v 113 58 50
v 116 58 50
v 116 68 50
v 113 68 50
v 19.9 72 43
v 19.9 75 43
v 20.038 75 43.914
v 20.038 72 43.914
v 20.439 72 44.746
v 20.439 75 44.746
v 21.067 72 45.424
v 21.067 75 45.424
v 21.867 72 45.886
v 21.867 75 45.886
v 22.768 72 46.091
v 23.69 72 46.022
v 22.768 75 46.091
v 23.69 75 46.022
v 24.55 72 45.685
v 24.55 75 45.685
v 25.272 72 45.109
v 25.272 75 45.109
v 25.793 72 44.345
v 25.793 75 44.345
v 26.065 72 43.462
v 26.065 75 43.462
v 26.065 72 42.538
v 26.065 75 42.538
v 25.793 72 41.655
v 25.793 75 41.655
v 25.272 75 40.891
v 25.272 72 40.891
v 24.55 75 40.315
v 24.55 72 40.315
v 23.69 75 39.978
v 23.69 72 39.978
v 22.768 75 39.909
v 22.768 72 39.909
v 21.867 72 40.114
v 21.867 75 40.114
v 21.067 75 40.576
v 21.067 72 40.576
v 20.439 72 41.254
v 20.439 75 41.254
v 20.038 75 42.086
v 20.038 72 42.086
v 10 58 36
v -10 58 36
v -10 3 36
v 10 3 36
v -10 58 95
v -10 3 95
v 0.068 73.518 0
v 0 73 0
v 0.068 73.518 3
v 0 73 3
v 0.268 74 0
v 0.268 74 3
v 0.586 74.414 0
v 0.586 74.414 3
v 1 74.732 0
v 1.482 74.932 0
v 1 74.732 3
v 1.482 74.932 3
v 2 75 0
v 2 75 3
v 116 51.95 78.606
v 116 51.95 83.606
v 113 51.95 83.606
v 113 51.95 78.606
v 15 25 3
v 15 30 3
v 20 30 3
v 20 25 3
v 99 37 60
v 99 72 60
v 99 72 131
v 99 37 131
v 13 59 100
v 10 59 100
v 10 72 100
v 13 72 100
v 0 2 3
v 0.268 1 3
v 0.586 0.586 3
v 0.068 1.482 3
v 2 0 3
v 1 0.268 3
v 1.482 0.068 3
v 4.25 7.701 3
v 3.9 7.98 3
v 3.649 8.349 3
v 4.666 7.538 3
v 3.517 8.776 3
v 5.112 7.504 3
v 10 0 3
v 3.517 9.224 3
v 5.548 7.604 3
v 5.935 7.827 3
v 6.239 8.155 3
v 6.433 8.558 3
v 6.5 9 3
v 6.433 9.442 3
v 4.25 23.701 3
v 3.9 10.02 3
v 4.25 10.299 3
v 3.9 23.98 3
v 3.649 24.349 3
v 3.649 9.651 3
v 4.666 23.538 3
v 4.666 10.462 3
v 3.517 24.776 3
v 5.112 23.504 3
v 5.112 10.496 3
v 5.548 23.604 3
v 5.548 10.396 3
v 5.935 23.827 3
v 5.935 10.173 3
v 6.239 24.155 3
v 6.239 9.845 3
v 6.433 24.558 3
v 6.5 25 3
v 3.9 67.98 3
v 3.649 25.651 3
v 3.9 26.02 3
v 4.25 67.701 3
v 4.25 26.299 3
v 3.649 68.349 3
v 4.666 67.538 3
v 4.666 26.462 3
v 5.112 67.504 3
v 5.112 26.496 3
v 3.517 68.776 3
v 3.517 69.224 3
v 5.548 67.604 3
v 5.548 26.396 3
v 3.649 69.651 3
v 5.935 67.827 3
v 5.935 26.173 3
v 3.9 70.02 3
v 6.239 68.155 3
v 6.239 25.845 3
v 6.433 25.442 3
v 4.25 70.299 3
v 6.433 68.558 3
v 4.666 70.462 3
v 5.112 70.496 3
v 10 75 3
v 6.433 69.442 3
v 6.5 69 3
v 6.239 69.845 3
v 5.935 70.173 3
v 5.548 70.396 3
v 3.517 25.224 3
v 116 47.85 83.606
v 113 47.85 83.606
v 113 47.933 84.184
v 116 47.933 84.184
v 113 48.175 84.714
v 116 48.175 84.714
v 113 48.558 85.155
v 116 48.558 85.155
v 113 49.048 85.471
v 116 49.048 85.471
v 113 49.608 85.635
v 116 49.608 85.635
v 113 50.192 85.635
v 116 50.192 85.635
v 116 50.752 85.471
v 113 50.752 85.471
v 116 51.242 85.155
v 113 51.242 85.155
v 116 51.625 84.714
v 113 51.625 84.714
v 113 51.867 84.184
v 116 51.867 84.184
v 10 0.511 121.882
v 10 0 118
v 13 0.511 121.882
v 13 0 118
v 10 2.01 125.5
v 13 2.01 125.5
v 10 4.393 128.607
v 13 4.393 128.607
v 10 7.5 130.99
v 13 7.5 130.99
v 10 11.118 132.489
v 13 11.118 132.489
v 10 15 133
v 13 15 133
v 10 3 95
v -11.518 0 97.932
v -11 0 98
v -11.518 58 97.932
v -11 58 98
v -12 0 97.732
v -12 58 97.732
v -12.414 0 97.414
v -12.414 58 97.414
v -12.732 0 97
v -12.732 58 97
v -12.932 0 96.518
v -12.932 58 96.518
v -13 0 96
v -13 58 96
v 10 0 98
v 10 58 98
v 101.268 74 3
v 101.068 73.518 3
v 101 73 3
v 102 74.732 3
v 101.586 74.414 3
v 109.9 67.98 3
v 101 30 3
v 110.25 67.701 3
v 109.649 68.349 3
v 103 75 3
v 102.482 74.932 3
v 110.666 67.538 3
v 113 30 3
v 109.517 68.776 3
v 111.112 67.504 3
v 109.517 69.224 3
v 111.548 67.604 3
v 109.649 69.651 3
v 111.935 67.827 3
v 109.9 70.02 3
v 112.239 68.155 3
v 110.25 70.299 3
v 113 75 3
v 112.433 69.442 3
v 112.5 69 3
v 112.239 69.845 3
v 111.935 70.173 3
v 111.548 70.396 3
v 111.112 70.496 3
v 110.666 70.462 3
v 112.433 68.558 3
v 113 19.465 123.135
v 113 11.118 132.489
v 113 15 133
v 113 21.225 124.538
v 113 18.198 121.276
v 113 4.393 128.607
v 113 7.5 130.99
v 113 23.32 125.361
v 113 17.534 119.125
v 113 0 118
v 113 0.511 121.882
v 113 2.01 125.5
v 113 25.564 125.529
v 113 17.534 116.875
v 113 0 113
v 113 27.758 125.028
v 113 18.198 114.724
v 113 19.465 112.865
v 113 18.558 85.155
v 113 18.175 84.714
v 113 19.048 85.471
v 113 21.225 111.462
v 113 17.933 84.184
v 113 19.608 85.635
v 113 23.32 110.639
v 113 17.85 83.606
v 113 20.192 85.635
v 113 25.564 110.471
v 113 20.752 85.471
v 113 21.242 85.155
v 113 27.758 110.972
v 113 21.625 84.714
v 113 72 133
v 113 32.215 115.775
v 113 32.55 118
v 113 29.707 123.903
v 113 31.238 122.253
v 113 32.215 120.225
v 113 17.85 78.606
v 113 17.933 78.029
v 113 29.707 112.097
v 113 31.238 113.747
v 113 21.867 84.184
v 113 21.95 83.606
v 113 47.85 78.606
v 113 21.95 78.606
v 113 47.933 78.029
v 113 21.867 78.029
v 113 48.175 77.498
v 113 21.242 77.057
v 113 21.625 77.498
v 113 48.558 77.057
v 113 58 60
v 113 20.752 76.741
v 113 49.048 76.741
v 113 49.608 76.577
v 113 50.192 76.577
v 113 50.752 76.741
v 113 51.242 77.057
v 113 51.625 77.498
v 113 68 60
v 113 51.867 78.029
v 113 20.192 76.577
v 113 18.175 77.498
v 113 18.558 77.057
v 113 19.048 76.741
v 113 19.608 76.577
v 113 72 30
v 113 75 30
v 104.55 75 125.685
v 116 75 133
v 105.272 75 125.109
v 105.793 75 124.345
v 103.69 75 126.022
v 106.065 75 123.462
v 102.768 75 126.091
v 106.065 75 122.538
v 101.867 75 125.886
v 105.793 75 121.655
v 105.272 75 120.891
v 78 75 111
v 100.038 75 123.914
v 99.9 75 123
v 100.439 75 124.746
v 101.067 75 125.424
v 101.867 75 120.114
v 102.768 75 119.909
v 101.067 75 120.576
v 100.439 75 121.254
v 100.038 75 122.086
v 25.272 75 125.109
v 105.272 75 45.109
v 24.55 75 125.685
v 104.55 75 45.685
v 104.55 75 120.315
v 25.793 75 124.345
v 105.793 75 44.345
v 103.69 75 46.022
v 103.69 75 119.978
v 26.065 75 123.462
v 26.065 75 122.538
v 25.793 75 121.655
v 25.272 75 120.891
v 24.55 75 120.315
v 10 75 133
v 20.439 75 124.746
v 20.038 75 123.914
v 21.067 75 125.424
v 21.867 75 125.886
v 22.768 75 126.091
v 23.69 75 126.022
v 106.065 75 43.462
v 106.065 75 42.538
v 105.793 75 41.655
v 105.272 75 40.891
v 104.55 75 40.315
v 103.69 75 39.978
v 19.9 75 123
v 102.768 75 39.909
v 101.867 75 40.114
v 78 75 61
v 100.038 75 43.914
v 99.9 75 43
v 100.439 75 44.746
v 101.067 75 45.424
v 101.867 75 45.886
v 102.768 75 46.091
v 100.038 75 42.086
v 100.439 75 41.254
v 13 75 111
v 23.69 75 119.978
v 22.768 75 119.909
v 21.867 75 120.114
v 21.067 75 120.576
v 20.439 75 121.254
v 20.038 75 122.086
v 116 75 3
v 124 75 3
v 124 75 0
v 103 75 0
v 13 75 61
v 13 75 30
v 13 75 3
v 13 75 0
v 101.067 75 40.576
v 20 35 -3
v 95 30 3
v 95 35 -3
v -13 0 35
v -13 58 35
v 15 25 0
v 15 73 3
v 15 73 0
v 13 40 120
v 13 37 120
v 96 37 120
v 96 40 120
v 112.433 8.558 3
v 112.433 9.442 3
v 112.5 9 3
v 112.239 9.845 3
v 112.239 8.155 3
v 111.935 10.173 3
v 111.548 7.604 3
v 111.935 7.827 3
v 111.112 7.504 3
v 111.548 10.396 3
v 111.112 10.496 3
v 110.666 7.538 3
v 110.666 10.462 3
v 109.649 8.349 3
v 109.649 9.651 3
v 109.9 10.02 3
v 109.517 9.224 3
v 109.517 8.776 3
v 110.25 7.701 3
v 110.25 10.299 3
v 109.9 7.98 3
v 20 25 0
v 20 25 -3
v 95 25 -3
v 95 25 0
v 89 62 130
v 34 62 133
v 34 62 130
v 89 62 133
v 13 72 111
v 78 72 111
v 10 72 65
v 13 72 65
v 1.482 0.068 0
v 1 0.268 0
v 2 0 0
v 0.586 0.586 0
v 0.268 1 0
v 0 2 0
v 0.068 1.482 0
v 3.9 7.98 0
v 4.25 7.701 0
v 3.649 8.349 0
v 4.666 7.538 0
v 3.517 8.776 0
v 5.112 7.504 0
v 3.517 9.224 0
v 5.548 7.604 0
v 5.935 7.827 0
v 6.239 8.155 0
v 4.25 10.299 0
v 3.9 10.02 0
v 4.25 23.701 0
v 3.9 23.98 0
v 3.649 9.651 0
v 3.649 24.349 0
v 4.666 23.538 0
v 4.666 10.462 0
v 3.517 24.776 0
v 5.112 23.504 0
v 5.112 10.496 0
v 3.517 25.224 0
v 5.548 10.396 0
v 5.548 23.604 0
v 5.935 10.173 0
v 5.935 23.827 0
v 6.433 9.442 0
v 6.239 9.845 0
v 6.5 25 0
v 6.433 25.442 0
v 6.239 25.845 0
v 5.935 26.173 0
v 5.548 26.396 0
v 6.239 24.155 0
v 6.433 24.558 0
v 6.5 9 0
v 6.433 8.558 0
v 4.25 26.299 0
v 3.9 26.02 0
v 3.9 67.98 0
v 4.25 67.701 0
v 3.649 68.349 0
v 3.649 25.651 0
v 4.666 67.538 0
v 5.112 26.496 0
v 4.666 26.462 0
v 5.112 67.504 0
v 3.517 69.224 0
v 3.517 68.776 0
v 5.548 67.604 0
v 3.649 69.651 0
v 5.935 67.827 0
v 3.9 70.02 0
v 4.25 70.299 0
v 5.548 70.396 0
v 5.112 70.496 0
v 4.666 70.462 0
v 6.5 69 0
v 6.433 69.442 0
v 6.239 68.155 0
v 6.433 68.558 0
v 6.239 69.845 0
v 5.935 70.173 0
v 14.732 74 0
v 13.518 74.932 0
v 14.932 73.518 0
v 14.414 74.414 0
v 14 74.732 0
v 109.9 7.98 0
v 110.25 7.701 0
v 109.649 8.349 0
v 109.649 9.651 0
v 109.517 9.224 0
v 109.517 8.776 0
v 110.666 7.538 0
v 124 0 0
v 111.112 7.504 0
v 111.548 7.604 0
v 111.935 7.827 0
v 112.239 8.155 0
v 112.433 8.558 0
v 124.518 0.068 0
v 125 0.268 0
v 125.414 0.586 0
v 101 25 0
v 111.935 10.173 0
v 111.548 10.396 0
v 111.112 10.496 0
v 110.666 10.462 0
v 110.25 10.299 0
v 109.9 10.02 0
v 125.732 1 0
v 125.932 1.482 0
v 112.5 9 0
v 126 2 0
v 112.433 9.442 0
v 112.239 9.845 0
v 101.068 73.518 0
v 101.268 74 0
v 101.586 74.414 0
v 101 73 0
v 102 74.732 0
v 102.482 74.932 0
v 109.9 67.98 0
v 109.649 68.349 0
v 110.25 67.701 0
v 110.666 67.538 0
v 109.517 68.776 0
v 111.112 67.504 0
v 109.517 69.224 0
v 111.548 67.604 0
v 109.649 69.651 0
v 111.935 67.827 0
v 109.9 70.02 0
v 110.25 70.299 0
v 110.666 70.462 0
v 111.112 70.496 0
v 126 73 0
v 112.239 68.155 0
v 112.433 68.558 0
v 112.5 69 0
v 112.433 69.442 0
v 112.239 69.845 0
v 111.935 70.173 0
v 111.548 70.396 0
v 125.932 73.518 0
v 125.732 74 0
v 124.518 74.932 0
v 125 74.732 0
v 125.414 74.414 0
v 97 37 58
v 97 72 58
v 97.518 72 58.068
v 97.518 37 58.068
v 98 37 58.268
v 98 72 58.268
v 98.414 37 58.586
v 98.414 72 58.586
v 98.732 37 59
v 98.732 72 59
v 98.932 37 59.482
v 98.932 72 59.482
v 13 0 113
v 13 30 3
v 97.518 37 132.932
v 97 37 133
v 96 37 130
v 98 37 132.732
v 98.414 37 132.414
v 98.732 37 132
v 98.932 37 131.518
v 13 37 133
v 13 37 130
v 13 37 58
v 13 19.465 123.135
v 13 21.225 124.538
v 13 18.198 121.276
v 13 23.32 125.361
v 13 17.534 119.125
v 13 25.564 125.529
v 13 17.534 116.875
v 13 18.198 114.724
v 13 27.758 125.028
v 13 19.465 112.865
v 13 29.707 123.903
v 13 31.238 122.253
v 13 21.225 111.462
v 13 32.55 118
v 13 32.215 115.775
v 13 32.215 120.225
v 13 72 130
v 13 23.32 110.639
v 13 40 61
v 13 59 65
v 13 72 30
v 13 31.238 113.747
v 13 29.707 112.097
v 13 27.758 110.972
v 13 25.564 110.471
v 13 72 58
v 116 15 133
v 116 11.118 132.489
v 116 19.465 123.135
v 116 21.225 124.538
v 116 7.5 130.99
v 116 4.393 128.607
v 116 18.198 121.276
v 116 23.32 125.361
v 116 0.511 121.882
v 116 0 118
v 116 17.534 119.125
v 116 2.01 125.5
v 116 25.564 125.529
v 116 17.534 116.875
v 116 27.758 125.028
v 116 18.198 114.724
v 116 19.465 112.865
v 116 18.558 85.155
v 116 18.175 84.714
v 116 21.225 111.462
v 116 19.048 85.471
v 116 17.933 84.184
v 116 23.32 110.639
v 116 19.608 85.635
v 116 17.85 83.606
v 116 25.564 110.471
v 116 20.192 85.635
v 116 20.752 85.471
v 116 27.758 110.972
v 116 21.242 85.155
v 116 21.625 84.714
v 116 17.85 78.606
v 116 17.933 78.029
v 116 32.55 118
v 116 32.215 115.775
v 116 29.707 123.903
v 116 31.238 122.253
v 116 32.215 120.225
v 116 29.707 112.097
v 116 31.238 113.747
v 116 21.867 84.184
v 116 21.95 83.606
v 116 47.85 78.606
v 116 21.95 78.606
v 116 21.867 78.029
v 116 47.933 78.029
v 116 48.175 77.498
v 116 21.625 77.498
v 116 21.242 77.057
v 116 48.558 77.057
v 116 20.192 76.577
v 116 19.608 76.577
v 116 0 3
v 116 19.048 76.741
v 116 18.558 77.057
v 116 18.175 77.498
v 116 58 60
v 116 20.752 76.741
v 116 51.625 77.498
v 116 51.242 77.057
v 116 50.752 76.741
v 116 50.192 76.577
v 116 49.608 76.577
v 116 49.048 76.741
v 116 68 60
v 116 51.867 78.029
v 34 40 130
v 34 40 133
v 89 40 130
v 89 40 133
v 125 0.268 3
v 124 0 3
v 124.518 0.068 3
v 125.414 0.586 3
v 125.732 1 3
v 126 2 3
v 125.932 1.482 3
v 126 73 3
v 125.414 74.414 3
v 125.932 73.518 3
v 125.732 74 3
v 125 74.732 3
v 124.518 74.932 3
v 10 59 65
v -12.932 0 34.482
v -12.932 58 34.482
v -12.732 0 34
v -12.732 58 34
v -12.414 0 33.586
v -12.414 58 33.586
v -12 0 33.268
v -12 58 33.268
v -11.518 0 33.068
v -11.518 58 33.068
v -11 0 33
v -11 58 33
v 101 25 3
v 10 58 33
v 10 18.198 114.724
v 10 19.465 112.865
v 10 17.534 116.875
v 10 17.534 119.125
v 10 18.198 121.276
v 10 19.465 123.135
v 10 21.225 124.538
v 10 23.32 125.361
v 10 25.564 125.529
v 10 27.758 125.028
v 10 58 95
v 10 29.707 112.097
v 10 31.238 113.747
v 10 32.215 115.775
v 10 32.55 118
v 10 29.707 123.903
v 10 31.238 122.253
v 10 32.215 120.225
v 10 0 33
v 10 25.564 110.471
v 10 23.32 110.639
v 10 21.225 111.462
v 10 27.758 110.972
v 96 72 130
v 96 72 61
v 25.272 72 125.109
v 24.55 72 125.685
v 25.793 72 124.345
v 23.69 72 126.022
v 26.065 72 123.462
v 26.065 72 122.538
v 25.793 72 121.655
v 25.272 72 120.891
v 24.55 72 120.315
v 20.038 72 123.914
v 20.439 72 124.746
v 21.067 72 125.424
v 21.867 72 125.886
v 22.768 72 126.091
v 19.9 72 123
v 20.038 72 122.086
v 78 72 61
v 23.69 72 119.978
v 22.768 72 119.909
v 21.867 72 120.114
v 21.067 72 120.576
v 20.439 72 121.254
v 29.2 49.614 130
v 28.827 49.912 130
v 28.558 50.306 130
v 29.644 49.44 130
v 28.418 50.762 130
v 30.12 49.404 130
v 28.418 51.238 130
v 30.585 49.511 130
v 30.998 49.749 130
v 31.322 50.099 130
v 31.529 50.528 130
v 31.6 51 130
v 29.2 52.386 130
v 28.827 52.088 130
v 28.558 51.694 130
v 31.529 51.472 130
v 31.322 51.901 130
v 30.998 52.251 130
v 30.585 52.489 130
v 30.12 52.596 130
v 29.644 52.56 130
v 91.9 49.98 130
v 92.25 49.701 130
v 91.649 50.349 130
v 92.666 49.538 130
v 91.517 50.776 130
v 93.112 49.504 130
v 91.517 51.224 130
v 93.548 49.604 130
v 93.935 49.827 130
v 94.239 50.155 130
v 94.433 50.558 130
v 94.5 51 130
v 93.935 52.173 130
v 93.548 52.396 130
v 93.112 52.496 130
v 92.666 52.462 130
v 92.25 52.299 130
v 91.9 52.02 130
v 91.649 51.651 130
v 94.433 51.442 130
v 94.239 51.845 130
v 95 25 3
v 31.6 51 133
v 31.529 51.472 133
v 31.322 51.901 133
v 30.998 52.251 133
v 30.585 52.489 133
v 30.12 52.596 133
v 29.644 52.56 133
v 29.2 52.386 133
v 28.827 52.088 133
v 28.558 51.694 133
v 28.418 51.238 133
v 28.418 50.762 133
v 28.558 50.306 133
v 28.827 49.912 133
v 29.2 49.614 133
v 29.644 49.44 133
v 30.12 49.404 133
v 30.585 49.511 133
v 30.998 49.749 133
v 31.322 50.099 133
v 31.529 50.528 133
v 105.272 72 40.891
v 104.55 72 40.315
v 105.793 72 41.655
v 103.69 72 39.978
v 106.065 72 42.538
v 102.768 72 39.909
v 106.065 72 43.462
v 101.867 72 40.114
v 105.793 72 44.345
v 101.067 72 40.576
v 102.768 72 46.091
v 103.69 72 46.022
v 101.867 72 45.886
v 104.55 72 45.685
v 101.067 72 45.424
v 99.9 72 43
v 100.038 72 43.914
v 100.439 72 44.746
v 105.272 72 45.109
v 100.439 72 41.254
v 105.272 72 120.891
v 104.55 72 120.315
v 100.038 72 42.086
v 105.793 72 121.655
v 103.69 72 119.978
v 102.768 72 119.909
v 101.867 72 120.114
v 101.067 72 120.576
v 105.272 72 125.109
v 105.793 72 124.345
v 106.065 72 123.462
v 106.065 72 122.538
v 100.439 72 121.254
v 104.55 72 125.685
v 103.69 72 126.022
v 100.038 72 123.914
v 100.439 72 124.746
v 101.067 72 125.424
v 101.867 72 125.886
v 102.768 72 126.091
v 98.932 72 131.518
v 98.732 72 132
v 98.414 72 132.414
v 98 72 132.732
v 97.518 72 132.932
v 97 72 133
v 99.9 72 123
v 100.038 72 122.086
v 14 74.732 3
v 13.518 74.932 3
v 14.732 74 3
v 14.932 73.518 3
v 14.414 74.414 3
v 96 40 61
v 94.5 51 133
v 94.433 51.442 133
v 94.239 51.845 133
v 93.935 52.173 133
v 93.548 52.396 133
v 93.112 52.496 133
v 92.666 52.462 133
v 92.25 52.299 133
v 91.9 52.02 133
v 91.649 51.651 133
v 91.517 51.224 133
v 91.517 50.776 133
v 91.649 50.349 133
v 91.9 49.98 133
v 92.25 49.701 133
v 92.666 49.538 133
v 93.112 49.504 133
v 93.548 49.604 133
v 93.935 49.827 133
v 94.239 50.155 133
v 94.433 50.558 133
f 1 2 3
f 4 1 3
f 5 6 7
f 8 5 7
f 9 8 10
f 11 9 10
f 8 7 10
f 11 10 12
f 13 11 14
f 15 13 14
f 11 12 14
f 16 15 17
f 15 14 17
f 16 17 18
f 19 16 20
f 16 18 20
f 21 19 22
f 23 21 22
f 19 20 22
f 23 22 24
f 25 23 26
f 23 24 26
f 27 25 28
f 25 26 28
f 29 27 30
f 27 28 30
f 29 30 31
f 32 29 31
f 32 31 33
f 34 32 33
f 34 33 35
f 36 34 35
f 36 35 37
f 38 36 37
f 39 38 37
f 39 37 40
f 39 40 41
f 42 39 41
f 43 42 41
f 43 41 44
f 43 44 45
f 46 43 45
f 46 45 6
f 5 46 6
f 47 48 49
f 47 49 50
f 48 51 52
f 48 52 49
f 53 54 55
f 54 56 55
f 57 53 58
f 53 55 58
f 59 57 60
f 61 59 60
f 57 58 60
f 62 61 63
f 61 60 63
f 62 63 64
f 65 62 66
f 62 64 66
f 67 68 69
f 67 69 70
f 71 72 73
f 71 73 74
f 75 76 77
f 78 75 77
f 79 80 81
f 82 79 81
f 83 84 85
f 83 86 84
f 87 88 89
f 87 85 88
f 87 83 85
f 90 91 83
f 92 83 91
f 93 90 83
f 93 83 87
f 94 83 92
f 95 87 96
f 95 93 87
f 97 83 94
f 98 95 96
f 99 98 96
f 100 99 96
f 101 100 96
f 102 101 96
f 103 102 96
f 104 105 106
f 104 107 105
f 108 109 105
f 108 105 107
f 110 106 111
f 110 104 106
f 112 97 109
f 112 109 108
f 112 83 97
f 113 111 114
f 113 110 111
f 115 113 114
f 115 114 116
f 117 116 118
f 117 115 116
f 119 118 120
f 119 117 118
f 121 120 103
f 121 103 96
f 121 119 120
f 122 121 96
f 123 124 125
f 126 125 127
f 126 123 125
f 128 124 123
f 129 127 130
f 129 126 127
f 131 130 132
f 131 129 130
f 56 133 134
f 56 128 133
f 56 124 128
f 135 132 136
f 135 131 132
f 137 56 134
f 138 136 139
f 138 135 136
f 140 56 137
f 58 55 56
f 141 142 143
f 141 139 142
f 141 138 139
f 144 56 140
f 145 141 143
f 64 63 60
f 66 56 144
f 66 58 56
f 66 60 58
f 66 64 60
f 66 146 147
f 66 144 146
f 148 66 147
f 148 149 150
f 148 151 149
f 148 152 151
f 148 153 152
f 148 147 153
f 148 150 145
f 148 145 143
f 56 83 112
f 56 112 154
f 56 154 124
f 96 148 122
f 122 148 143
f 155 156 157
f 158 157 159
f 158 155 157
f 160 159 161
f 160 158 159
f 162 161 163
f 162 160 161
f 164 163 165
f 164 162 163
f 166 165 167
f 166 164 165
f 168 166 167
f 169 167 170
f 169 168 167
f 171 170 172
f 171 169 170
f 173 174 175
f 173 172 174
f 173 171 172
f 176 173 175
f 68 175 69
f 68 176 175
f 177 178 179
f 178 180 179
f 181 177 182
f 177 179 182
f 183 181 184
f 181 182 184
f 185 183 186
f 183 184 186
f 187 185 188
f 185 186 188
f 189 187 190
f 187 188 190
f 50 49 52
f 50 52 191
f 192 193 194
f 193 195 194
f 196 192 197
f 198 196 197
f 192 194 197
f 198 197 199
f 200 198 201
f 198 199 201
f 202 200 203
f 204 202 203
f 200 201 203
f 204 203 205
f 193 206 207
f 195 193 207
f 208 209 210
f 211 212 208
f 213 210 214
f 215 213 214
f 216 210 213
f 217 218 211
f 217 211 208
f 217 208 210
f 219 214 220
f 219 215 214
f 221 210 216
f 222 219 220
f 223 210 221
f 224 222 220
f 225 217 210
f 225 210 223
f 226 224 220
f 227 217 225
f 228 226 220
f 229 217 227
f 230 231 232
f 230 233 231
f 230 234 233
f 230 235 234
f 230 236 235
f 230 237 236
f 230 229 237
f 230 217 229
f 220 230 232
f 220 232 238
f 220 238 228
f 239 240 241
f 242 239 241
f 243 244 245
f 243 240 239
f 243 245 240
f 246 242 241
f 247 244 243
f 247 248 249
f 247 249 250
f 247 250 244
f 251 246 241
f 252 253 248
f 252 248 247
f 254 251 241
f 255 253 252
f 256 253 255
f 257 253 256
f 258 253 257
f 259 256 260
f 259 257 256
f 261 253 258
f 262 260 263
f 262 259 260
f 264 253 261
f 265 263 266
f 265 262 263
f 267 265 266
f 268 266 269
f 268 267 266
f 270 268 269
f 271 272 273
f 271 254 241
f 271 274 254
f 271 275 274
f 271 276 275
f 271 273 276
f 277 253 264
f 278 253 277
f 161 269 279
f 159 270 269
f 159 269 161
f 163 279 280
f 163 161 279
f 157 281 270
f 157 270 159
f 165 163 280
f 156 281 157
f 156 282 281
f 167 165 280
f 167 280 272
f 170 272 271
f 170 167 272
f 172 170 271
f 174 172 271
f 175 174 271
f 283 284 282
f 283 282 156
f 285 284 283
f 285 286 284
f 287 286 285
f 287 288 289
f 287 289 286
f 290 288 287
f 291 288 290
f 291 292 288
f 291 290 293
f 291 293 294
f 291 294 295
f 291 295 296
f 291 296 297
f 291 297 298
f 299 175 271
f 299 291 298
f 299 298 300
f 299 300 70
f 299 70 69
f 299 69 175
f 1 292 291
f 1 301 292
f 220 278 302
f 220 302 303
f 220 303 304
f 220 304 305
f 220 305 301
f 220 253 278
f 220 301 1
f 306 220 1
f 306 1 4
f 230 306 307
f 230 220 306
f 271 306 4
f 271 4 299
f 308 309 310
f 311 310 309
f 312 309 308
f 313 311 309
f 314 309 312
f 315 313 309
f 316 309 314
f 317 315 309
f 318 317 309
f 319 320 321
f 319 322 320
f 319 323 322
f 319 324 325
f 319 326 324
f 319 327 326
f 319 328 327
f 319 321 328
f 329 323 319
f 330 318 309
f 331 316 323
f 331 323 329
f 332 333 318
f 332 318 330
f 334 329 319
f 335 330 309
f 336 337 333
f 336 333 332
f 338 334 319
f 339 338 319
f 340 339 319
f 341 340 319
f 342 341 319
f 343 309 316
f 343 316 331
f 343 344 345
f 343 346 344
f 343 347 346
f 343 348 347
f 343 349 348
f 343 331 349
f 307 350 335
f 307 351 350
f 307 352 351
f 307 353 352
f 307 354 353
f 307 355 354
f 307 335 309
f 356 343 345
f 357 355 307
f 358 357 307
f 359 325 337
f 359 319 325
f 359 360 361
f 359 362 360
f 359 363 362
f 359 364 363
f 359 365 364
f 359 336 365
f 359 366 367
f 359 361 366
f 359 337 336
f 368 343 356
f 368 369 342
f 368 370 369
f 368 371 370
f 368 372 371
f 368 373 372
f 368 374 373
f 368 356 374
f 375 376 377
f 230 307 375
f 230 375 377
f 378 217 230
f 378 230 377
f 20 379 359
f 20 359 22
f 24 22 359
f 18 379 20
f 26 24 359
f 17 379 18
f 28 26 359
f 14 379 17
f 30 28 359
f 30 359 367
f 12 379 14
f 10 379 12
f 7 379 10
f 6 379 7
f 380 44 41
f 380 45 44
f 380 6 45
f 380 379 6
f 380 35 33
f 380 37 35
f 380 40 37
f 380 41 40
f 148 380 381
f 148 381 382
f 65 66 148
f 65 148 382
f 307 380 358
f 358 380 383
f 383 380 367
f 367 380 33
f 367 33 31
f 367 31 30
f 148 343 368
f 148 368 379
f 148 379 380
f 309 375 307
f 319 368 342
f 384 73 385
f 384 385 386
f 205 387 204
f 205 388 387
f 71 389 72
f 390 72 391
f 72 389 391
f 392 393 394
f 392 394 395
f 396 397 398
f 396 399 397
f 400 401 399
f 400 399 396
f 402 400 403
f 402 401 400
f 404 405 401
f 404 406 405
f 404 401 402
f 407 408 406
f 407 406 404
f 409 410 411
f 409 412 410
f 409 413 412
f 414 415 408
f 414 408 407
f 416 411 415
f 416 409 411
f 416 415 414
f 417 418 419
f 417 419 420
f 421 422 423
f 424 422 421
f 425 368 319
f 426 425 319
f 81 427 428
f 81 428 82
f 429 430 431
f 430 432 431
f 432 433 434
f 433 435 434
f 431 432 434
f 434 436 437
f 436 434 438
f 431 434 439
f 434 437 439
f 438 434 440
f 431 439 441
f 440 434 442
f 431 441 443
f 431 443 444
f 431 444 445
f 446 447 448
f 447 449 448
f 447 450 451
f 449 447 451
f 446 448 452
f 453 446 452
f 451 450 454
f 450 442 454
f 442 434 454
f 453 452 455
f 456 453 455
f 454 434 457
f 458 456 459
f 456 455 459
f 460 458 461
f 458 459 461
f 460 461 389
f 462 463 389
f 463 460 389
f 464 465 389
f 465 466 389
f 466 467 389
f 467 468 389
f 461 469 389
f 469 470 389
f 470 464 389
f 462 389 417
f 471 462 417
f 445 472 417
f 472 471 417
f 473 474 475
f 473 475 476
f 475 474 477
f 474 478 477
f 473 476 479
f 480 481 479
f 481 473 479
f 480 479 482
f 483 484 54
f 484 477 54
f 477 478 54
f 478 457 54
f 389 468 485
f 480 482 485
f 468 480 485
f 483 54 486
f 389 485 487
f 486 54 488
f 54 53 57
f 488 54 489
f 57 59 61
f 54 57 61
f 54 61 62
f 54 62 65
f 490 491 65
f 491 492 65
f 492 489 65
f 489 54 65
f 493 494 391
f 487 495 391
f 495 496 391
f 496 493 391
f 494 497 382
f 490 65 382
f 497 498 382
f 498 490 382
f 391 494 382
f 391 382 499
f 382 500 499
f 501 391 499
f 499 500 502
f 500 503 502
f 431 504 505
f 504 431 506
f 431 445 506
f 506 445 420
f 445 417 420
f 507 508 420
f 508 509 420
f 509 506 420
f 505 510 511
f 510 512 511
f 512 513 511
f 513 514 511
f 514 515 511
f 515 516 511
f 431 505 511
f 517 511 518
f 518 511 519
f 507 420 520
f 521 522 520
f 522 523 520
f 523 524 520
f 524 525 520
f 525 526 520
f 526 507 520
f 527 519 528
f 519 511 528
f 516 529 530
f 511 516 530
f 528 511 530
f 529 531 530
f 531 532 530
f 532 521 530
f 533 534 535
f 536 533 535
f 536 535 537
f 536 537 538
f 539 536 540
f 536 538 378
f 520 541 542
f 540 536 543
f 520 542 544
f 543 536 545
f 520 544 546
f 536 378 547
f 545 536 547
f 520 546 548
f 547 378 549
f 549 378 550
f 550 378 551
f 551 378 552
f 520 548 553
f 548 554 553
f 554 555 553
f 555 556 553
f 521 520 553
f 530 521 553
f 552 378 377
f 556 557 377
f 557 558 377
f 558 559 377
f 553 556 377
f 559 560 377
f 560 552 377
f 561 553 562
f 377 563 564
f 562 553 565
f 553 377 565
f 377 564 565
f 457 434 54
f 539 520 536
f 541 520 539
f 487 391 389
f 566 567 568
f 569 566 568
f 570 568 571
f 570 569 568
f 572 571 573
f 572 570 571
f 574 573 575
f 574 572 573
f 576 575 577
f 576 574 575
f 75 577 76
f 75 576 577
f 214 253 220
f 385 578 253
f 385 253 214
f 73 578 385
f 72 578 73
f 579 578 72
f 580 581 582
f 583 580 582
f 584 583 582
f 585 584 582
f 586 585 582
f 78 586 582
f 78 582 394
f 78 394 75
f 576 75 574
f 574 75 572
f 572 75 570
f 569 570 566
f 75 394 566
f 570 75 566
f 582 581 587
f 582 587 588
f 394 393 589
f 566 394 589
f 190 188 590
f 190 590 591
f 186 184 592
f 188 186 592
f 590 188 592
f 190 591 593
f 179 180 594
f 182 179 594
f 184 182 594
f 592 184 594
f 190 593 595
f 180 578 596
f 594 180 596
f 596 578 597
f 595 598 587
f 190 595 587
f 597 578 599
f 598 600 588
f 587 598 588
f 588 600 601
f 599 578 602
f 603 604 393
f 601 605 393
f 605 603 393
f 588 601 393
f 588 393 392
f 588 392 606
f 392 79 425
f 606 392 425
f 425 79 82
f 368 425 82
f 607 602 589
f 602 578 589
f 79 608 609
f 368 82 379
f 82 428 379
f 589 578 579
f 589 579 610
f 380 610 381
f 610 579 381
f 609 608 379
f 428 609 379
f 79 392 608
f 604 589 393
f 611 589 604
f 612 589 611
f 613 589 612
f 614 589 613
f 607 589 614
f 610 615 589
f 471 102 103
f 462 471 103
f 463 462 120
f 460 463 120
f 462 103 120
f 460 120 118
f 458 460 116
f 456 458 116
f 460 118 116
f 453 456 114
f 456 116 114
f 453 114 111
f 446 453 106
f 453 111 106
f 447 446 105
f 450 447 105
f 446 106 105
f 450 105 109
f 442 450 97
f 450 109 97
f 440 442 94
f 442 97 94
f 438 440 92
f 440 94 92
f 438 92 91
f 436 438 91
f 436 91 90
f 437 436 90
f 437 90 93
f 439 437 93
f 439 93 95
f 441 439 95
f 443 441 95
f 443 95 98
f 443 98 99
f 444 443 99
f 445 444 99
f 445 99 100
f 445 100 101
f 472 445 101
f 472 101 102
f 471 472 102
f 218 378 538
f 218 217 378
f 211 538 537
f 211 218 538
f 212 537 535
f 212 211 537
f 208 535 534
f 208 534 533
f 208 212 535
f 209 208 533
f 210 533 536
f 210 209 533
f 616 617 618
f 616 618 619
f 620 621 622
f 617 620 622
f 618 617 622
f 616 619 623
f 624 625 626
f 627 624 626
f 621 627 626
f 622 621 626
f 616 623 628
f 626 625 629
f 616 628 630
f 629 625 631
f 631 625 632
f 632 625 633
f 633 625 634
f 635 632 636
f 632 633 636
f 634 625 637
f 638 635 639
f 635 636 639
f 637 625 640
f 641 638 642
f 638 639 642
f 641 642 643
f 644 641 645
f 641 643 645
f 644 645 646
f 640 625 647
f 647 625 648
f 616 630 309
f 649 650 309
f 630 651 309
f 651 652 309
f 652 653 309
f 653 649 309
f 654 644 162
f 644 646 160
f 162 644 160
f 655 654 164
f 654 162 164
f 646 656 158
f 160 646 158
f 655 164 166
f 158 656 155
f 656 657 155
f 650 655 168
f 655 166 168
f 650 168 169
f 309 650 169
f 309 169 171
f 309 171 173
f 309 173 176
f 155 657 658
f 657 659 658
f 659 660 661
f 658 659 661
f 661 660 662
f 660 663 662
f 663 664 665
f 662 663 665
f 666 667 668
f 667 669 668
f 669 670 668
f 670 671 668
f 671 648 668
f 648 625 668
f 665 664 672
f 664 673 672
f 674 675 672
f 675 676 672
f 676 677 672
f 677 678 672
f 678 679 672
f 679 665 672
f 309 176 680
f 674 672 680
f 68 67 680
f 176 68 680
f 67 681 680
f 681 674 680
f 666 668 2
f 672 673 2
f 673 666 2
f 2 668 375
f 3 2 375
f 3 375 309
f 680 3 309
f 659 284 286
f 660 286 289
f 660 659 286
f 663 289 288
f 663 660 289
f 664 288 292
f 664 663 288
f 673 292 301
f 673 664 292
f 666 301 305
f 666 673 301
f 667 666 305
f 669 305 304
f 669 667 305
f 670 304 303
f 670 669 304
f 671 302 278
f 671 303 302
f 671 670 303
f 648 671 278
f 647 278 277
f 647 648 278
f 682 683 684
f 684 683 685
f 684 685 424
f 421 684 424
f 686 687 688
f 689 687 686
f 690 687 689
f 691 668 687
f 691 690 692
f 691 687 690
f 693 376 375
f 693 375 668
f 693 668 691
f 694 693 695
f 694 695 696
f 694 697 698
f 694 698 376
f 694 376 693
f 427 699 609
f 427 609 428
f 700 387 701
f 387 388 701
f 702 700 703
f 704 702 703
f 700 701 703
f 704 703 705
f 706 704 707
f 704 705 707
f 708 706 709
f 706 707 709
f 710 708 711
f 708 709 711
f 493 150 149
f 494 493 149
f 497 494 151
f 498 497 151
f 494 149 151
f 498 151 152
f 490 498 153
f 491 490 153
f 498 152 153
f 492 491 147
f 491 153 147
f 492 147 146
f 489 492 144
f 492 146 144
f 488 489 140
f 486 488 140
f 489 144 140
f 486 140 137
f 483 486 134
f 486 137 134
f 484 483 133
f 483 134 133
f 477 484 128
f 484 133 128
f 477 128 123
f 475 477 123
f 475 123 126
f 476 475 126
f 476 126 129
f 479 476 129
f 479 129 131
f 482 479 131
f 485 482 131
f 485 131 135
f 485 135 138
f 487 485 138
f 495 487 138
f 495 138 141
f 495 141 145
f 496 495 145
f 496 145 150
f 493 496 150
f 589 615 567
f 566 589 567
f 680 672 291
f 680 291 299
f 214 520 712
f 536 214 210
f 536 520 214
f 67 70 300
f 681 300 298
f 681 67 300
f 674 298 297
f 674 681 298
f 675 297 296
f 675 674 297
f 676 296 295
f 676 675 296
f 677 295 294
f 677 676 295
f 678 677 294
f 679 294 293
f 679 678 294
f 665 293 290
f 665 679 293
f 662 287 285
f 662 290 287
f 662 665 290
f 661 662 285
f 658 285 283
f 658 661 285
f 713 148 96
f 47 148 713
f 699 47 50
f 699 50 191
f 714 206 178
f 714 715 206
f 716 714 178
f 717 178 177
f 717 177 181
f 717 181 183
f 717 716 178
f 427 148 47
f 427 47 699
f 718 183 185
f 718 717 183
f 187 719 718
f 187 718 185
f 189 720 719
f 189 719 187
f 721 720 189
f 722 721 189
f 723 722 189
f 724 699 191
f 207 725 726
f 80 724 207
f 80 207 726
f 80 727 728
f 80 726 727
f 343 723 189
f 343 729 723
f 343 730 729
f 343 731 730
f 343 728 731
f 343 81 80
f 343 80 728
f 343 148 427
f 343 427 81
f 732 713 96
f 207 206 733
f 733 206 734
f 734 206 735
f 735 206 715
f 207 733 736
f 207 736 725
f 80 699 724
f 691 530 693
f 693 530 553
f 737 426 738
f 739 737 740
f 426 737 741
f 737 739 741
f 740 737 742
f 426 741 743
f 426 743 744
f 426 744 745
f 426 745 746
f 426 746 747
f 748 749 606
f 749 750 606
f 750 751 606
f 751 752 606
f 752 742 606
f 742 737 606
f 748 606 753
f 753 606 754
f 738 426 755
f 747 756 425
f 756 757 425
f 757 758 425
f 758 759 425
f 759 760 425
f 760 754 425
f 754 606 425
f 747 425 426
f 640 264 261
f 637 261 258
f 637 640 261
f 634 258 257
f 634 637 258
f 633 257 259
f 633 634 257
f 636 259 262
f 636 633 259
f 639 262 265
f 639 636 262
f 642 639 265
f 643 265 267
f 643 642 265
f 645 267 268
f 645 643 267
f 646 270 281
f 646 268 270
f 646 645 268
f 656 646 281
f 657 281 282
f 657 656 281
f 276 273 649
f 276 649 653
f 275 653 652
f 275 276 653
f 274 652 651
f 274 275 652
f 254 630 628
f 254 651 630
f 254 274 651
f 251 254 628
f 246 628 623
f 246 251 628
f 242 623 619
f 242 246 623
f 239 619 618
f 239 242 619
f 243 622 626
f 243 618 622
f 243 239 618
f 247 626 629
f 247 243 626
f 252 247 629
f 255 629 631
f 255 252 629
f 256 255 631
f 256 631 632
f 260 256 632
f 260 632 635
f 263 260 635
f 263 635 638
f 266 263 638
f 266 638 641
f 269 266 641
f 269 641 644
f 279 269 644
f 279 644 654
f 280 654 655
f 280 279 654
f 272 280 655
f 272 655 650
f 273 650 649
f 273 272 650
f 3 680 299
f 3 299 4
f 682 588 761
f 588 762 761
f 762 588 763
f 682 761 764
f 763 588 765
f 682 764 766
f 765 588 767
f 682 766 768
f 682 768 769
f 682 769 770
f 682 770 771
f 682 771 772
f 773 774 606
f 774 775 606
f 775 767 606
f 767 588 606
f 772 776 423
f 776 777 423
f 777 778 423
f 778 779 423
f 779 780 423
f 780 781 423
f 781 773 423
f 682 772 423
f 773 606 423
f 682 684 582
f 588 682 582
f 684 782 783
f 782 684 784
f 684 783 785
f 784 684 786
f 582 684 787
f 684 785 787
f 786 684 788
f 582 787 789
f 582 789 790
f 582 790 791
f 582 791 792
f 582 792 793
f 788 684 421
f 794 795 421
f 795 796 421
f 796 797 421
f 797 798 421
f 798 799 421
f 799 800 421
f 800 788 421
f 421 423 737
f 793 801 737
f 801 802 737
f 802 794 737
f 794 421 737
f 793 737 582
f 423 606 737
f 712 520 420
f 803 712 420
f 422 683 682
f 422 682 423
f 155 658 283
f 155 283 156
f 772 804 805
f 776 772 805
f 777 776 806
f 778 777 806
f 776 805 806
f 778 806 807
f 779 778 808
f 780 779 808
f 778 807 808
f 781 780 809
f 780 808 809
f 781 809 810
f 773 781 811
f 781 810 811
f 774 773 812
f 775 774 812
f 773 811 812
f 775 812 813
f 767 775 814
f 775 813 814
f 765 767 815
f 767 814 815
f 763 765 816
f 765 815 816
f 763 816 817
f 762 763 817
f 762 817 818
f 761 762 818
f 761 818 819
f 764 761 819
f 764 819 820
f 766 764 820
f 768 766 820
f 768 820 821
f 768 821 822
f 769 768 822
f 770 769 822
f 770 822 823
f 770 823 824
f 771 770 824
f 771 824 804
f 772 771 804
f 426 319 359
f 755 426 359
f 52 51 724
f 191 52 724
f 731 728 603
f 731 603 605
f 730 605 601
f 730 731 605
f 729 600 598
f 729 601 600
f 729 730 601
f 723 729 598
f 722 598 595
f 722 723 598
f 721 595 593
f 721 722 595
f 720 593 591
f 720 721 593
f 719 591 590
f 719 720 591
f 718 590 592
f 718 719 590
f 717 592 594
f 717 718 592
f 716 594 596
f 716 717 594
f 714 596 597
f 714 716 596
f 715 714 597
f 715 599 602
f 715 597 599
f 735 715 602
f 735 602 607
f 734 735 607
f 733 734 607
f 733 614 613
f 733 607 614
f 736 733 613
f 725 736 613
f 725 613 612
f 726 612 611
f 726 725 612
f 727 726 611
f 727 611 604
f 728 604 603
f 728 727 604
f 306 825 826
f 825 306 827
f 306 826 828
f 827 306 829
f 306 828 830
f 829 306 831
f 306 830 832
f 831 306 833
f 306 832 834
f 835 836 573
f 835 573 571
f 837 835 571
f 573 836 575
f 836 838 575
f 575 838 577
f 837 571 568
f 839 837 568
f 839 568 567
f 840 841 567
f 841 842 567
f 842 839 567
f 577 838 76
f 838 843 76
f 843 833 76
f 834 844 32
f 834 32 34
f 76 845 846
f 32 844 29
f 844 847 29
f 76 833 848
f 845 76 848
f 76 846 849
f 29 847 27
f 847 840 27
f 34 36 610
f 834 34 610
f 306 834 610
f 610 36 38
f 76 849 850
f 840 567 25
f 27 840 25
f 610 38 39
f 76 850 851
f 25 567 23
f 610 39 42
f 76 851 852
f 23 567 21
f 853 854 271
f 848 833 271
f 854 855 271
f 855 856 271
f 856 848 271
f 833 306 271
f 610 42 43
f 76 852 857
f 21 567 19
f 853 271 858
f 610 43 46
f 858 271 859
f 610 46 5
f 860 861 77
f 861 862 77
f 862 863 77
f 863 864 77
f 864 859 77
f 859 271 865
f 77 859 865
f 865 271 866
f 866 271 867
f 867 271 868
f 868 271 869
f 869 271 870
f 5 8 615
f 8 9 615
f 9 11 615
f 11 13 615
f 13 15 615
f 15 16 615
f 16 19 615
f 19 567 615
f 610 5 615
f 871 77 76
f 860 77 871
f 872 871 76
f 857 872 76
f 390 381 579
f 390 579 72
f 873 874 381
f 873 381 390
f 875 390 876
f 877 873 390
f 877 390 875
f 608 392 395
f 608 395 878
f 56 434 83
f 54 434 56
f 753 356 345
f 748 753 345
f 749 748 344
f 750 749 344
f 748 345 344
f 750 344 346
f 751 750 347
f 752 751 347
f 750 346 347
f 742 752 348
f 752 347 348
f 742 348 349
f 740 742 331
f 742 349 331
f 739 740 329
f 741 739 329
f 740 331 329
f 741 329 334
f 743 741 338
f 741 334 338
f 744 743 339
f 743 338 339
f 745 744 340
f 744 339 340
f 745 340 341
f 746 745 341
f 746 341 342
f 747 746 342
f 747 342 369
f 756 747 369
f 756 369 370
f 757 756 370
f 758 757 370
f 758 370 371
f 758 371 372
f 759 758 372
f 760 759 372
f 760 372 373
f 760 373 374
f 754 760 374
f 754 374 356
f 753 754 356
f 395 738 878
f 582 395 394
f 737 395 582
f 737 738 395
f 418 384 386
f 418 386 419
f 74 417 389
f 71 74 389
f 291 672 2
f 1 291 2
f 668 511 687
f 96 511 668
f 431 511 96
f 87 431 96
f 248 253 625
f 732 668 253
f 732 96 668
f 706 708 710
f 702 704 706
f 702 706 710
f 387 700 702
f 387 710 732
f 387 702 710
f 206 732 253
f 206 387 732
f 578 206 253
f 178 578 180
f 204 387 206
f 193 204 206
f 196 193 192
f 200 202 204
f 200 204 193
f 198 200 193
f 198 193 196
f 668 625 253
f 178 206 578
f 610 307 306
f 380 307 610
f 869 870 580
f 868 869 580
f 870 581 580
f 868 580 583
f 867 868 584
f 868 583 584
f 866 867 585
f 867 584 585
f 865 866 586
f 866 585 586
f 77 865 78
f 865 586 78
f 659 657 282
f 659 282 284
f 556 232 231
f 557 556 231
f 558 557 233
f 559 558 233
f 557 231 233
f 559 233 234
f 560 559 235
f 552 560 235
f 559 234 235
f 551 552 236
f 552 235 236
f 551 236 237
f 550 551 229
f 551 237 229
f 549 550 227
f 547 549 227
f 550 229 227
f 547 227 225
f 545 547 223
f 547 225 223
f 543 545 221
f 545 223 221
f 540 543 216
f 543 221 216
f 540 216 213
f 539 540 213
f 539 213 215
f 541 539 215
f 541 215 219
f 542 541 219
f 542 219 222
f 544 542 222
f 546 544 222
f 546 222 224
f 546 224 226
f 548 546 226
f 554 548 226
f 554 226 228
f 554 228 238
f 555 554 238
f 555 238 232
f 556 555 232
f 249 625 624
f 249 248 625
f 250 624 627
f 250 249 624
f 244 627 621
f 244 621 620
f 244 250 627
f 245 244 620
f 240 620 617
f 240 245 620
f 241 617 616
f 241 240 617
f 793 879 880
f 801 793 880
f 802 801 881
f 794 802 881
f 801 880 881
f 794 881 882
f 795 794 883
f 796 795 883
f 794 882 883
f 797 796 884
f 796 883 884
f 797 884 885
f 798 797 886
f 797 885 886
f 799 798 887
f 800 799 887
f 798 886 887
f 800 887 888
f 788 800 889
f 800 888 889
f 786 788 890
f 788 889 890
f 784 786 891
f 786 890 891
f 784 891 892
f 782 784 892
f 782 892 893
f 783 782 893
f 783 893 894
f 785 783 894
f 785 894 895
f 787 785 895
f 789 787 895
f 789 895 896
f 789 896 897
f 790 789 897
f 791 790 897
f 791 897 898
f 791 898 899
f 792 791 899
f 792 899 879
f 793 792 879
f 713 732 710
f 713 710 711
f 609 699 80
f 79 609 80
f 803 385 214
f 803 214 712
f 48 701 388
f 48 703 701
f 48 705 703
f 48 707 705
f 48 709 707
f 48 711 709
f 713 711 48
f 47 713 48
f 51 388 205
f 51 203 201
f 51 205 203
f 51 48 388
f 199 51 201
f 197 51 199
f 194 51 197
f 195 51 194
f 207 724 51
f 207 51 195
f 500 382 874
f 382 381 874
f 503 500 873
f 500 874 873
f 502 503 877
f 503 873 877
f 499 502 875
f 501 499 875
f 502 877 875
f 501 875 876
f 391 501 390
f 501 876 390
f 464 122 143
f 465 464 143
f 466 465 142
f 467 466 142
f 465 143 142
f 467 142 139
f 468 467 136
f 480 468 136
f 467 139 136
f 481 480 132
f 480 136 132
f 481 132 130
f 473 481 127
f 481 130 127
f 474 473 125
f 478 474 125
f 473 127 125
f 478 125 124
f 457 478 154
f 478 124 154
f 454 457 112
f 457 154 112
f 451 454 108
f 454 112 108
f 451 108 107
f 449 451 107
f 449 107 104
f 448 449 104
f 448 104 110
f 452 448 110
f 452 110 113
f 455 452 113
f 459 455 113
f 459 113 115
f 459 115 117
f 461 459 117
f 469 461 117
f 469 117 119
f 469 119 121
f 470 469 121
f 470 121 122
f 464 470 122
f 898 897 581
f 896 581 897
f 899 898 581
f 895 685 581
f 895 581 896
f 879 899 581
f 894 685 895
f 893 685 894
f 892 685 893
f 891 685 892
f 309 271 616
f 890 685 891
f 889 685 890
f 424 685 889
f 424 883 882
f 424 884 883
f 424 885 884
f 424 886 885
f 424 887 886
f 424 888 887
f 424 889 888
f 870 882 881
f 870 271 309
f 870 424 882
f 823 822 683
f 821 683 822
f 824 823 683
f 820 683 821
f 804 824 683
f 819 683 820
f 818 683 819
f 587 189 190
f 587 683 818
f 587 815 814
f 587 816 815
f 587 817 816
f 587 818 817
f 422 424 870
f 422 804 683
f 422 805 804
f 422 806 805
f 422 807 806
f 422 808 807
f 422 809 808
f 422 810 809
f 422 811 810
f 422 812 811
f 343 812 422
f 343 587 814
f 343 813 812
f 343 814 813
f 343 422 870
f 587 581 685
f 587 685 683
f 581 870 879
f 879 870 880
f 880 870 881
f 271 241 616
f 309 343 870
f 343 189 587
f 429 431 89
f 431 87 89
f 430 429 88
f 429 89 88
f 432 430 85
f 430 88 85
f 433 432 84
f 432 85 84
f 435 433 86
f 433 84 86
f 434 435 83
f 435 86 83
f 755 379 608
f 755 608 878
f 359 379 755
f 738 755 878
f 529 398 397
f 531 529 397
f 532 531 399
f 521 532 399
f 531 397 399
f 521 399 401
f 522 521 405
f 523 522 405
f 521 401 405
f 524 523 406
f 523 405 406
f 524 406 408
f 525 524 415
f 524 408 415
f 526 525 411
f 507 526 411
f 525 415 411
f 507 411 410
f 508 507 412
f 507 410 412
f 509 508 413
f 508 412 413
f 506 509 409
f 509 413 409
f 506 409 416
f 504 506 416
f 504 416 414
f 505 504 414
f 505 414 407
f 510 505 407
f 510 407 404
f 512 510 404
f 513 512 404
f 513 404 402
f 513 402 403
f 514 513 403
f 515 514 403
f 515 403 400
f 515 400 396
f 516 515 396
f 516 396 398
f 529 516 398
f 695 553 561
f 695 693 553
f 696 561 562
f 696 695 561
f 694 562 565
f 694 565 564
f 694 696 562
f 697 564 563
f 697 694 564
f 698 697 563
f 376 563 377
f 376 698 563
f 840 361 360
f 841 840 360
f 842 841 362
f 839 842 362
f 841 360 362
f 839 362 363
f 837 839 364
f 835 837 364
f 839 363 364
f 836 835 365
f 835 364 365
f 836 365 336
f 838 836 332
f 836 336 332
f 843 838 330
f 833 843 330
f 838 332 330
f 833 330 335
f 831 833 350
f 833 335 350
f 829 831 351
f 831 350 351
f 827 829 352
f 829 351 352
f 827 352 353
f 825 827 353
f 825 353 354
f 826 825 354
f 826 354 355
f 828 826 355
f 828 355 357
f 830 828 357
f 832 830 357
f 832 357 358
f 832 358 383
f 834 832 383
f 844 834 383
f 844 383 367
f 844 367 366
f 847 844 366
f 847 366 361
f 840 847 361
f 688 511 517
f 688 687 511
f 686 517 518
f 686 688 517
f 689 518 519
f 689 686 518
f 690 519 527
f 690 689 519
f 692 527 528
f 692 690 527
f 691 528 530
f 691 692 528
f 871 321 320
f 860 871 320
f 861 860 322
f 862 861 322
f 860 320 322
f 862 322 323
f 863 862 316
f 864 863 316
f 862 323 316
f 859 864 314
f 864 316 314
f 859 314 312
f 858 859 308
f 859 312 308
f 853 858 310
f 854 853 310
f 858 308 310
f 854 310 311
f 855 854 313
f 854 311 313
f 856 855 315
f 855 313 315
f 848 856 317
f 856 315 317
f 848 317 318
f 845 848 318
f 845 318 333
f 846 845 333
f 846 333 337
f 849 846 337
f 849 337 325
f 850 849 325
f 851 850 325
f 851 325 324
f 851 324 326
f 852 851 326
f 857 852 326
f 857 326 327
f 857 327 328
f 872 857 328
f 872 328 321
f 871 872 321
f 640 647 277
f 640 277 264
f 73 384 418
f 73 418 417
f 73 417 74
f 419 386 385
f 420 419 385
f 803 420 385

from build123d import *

# Parameters (mm, degrees)
SKETCH_1_W                      = 126
SKETCH_1_H                      = 75
EXTRUDE_1_DEPTH                 = 3
CUT_EXTRUDE_2_REACH             = 148.663
SKETCH_3_W                      = 86
SKETCH_3_H                      = 50
SKETCH_2_R                      = 1.5
CUT_EXTRUDE_1_DEPTH             = 147.662878739
SKETCH_4_W                      = 3
SKETCH_4_H                      = 75
EXTRUDE_2_DEPTH                 = 130
SKETCH_10_W                     = 100
SKETCH_10_H                     = 3
EXTRUDE_5_DEPTH                 = 100
CUT_EXTRUDE_5_REACH             = 199.965
SKETCH_9_R                      = 3.1
CUT_EXTRUDE_5_DIRECTION_2_DEPTH = 198.964643308
EXTRUDE_7_REACH                 = 191.955
CUT_EXTRUDE_9_DEPTH             = 190.95525789
CUT_EXTRUDE_9_DEPTH_BACK        = 190.95525789
SKETCH_18_R                     = 7.55
SKETCH_33_W                     = 65
SKETCH_33_H                     = 50
CUT_EXTRUDE_14_DEPTH            = 5
FILLET_1_R                      = 2
FILLET_2_R                      = 15
CUT_EXTRUDE_11_DEPTH            = 10
SKETCH_37_W                     = 89
SKETCH_37_H                     = 75
SKETCH_37_W_2                   = 83
SKETCH_37_H_2                   = 69
EXTRUDE_21_DEPTH                = 35
EXTRUDE_22_REACH                = 191.955
SKETCH_38_W                     = 59
SKETCH_38_H                     = 3
EXTRUDE_START                   = 5
EXTRUDE_23_DEPTH                = 75
SKETCH_43_W                     = 65
SKETCH_43_H                     = 58
EXTRUDE_24_DEPTH                = 23
SKETCH_44_W                     = 20
SKETCH_44_H                     = 59
CUT_EXTRUDE_15_DEPTH            = 55
SKETCH_48_W                     = 35
SKETCH_48_H                     = 13
CUT_EXTRUDE_16_DEPTH            = 12
SKETCH_49_W                     = 55
SKETCH_49_H                     = 22
CUT_EXTRUDE_18_DEPTH            = 12
SKETCH_50_R                     = 1.6
SKETCH_50_R_2                   = 1.5
CUT_EXTRUDE_19_DEPTH            = 12
CUT_EXTRUDE_21_REACH            = 201.887
SKETCH_52_W                     = 10
SKETCH_52_H                     = 10
FILLET_3_R                      = 2
SKETCH_53_W                     = 100
SKETCH_53_H                     = 3
EXTRUDE_25_DEPTH                = 3


with BuildPart() as part:
    # 草图1 → 凸台-拉伸1 (new body)
    with BuildSketch(Plane.XY):
        with Locations((63, 37.5)):
            Rectangle(SKETCH_1_W, SKETCH_1_H)
    extrude(amount=EXTRUDE_1_DEPTH)

    # 草图3 → 切除-拉伸2 (cut, up to next)
    with BuildSketch(Plane(origin=(0, 0, 0), x_dir=(-1, 0, 0), z_dir=(0, 0, -1)), mode=Mode.PRIVATE) as cut_extrude_2_sk1:
        with Locations((-58, 50)):
            Rectangle(SKETCH_3_W, SKETCH_3_H)
    cut_extrude_2_tool1 = extrude(cut_extrude_2_sk1.sketch, amount=-CUT_EXTRUDE_2_REACH, mode=Mode.PRIVATE) & part.part
    add(cut_extrude_2_tool1.solids().sort_by_distance((58, 50, 0))[0], mode=Mode.SUBTRACT)

    # 草图2 → 切除-拉伸1 (cut, through all)
    with BuildSketch(Plane.XY.offset(3)):
        with Locations((5, 69)):
            Circle(SKETCH_2_R)
        with Locations((5, 25)):
            Circle(SKETCH_2_R)
        with Locations((5, 9)):
            Circle(SKETCH_2_R)
        with Locations((111, 69)):
            Circle(SKETCH_2_R)
        with Locations((111, 9)):
            Circle(SKETCH_2_R)
    extrude(amount=-CUT_EXTRUDE_1_DEPTH, mode=Mode.SUBTRACT)

    # 草图4 → 凸台-拉伸2 (add)
    with BuildSketch(Plane.XY.offset(3)):
        with Locations((11.5, 37.5)):
            Rectangle(SKETCH_4_W, SKETCH_4_H)
    extrude_2 = extrude(amount=EXTRUDE_2_DEPTH)

    # 镜向1: 凸台-拉伸2 across plane
    add(extrude_2.mirror(Plane.ZY.offset(-63)))

    # 草图10 → 凸台-拉伸5 (add)
    with BuildSketch(Plane(origin=(13, 0, 0), x_dir=(0, 0, -1), z_dir=(1, 0, 0))):
        with Locations((-83, 73.5)):
            Rectangle(SKETCH_10_W, SKETCH_10_H)
    extrude(amount=EXTRUDE_5_DEPTH)

    # 草图9 → 切除-拉伸5 (cut, up to next)
    with BuildSketch(Plane(origin=(0, 75, 0), x_dir=(1, 0, 0), z_dir=(0, 1, 0)), mode=Mode.PRIVATE) as cut_extrude_5_sk1:
        with Locations(Location((23, -123, 0), (0, 0, 180))):
            Circle(SKETCH_9_R)
    cut_extrude_5_tool1 = extrude(cut_extrude_5_sk1.sketch, amount=-CUT_EXTRUDE_5_REACH, mode=Mode.PRIVATE) & part.part
    # 草图9 → 切除-拉伸5 (cut, up to next)
    with BuildSketch(Plane(origin=(0, 75, 0), x_dir=(1, 0, 0), z_dir=(0, 1, 0)), mode=Mode.PRIVATE) as cut_extrude_5_sk2:
        with Locations(Location((23, -43, 0), (0, 0, 180))):
            Circle(SKETCH_9_R)
    cut_extrude_5_tool2 = extrude(cut_extrude_5_sk2.sketch, amount=-CUT_EXTRUDE_5_REACH, mode=Mode.PRIVATE) & part.part
    # 草图9 → 切除-拉伸5 (cut, up to next)
    with BuildSketch(Plane(origin=(0, 75, 0), x_dir=(1, 0, 0), z_dir=(0, 1, 0)), mode=Mode.PRIVATE) as cut_extrude_5_sk3:
        with Locations(Location((103, -123, 0), (0, 0, 180))):
            Circle(SKETCH_9_R)
    cut_extrude_5_tool3 = extrude(cut_extrude_5_sk3.sketch, amount=-CUT_EXTRUDE_5_REACH, mode=Mode.PRIVATE) & part.part
    # 草图9 → 切除-拉伸5 (cut, up to next)
    with BuildSketch(Plane(origin=(0, 75, 0), x_dir=(1, 0, 0), z_dir=(0, 1, 0)), mode=Mode.PRIVATE) as cut_extrude_5_sk4:
        with Locations(Location((103, -43, 0), (0, 0, 180))):
            Circle(SKETCH_9_R)
    cut_extrude_5_tool4 = extrude(cut_extrude_5_sk4.sketch, amount=-CUT_EXTRUDE_5_REACH, mode=Mode.PRIVATE) & part.part
    add(cut_extrude_5_tool1.solids().sort_by_distance((23, 75, 123))[0], mode=Mode.SUBTRACT)
    add(cut_extrude_5_tool2.solids().sort_by_distance((23, 75, 43))[0], mode=Mode.SUBTRACT)
    add(cut_extrude_5_tool3.solids().sort_by_distance((103, 75, 123))[0], mode=Mode.SUBTRACT)
    add(cut_extrude_5_tool4.solids().sort_by_distance((103, 75, 43))[0], mode=Mode.SUBTRACT)

    # 草图9 → 切除-拉伸5 direction 2 (cut)
    with BuildSketch(Plane(origin=(0, 75, 0), x_dir=(1, 0, 0), z_dir=(0, 1, 0))):
        with Locations(Location((23, -123, 0), (0, 0, 180))):
            Circle(SKETCH_9_R)
        with Locations(Location((23, -43, 0), (0, 0, 180))):
            Circle(SKETCH_9_R)
        with Locations(Location((103, -123, 0), (0, 0, 180))):
            Circle(SKETCH_9_R)
        with Locations(Location((103, -43, 0), (0, 0, 180))):
            Circle(SKETCH_9_R)
    extrude(amount=CUT_EXTRUDE_5_DIRECTION_2_DEPTH, mode=Mode.SUBTRACT)

    # 凸台-拉伸7: up to this face of the body (flat: up to its plane)
    extrude_7_end = Plane(part.part.faces().sort_by_distance((113, 36.357142857, 67.523809524))[0])
    # 草图17 → 凸台-拉伸7 (add, up to the picked face)
    with BuildSketch(Plane(origin=(13, 0, 0), x_dir=(0, 0, -1), z_dir=(1, 0, 0)), mode=Mode.PRIVATE) as extrude_7_sk1:
        Polygon((-3, 0), (-113, 0), (-3, 30), align=None)
    extrude_7_tool1 = split(extrude(extrude_7_sk1.sketch, amount=EXTRUDE_7_REACH, mode=Mode.PRIVATE), bisect_by=extrude_7_end, keep=Keep.BOTH, mode=Mode.PRIVATE)
    add(extrude_7_tool1.solids().sort_by(Axis((13, 10, 39.666667), (1, 0, 0)))[0])

    # 草图18 → 切除-拉伸9 (cut, two sides: drawn at the far end of the back side and taken through both)
    with BuildSketch(Plane(origin=(13, 0, 0), x_dir=(0, 0, -1), z_dir=(1, 0, 0)).offset(-CUT_EXTRUDE_9_DEPTH_BACK)):
        with Locations(Location((-118, 25, 0), (0, 0, 90))):
            Circle(SKETCH_18_R)
    extrude(amount=CUT_EXTRUDE_9_DEPTH + CUT_EXTRUDE_9_DEPTH_BACK, mode=Mode.SUBTRACT)

    # 草图33 → 切除-拉伸14 (cut)
    with BuildSketch(Plane(origin=(0, 75, 0), x_dir=(1, 0, 0), z_dir=(0, 1, 0))):
        with Locations((45.5, -86)):
            Rectangle(SKETCH_33_W, SKETCH_33_H)
    extrude(amount=-CUT_EXTRUDE_14_DEPTH, mode=Mode.SUBTRACT)

    # 圆角1
    fillet_1_edges = [part.edges().sort_by_distance(p)[0] for p in [
        (101, 75, 1.5),
        (15, 75, 1.5),
        (0, 0, 1.5),
        (0, 75, 1.5),
        (126, 75, 1.5),
        (126, 0, 1.5),
    ]]
    fillet(fillet_1_edges, radius=FILLET_1_R)

    # 圆角2
    fillet_2_edges = [part.edges().sort_by_distance(p)[0] for p in [
        (11.5, 0, 133),
        (114.5, 0, 133),
    ]]
    fillet(fillet_2_edges, radius=FILLET_2_R)

    # 草图20 → 切除-拉伸11 (cut)
    with BuildSketch(Plane(origin=(116, 0, 0), x_dir=(0, 0, -1), z_dir=(1, 0, 0))):
        with BuildLine():
            Line((-83.606081957, 51.95), (-78.606081957, 51.95))
            ThreePointArc((-78.606081957, 51.95), (-76.556081957, 49.9), (-78.606081957, 47.85))
            Line((-78.606081957, 47.85), (-83.606081957, 47.85))
            ThreePointArc((-83.606081957, 47.85), (-85.656081957, 49.9), (-83.606081957, 51.95))
        make_face()
        with BuildLine():
            Line((-83.606081957, 21.95), (-78.606081957, 21.95))
            ThreePointArc((-78.606081957, 21.95), (-76.556081957, 19.9), (-78.606081957, 17.85))
            Line((-78.606081957, 17.85), (-83.606081957, 17.85))
            ThreePointArc((-83.606081957, 17.85), (-85.656081957, 19.9), (-83.606081957, 21.95))
        make_face()
    extrude(amount=-CUT_EXTRUDE_11_DEPTH, mode=Mode.SUBTRACT)

    # 草图37 → 凸台-拉伸21 (add)
    with BuildSketch(Plane.XZ.offset(-72)):
        with Locations((54.5, 95.5)):
            Rectangle(SKETCH_37_W, SKETCH_37_H)
        with Locations((54.5, 95.5)):
            Rectangle(SKETCH_37_W_2, SKETCH_37_H_2, mode=Mode.SUBTRACT)
    extrude(amount=EXTRUDE_21_DEPTH)

    # 草图38 → 凸台-拉伸22 (add, up to next)
    with BuildSketch(Plane(origin=(13, 0, 0), x_dir=(0, 0, -1), z_dir=(1, 0, 0)), mode=Mode.PRIVATE) as extrude_22_sk1:
        with Locations((-90.5, 38.5)):
            Rectangle(SKETCH_38_W, SKETCH_38_H)
    extrude_22_tool1 = extrude(extrude_22_sk1.sketch, amount=EXTRUDE_22_REACH, mode=Mode.PRIVATE) - part.part
    add(extrude_22_tool1.solids().sort_by_distance((13, 38.5, 90.5))[0])

    # 草图41 → 凸台-拉伸23 (add)
    with BuildSketch(Plane(origin=(15, 0, 0), x_dir=(0, 0, -1), z_dir=(1, 0, 0)).offset(EXTRUDE_START)):
        Polygon((-3, 25), (-3, 30), (3, 35), (3, 25), align=None)
    extrude(amount=EXTRUDE_23_DEPTH)

    # 草图43 → 凸台-拉伸24 (add)
    with BuildSketch(Plane.ZY.offset(-10)):
        with Locations((65.5, 29)):
            Rectangle(SKETCH_43_W, SKETCH_43_H)
    extrude(amount=EXTRUDE_24_DEPTH)

    # 草图44 → 切除-拉伸15 (cut)
    with BuildSketch(Plane(origin=(0, 58, 0), x_dir=(1, 0, 0), z_dir=(0, 1, 0))):
        with Locations((0, -65.5)):
            Rectangle(SKETCH_44_W, SKETCH_44_H)
    extrude(amount=-CUT_EXTRUDE_15_DEPTH, mode=Mode.SUBTRACT)

    # 草图48 → 切除-拉伸16 (cut)
    with BuildSketch(Plane.ZY.offset(-10)):
        with Locations((82.5, 65.5)):
            Rectangle(SKETCH_48_W, SKETCH_48_H)
    extrude(amount=-CUT_EXTRUDE_16_DEPTH, mode=Mode.SUBTRACT)

    # 草图49 → 切除-拉伸18 (cut)
    with BuildSketch(Plane.XY.offset(133)):
        with Locations((61.5, 51)):
            Rectangle(SKETCH_49_W, SKETCH_49_H)
    extrude(amount=-CUT_EXTRUDE_18_DEPTH, mode=Mode.SUBTRACT)

    # 草图50 → 切除-拉伸19 (cut)
    with BuildSketch(Plane.XY.offset(133)):
        with Locations((30, 51)):
            Circle(SKETCH_50_R)
        with Locations((93, 51)):
            Circle(SKETCH_50_R_2)
    extrude(amount=-CUT_EXTRUDE_19_DEPTH, mode=Mode.SUBTRACT)

    # 草图52 → 切除-拉伸21 (cut, up to next)
    with BuildSketch(Plane(origin=(116, 0, 0), x_dir=(0, 0, -1), z_dir=(1, 0, 0)), mode=Mode.PRIVATE) as cut_extrude_21_sk1:
        with Locations((-55, 63)):
            Rectangle(SKETCH_52_W, SKETCH_52_H)
    cut_extrude_21_tool1 = extrude(cut_extrude_21_sk1.sketch, amount=-CUT_EXTRUDE_21_REACH, mode=Mode.PRIVATE) & part.part
    add(cut_extrude_21_tool1.solids().sort_by_distance((116, 63, 55))[0], mode=Mode.SUBTRACT)

    # 圆角3
    fillet_3_edges = [part.edges().sort_by_distance(p)[0] for p in [
        (99, 54.5, 133),
        (99, 54.5, 58),
        (-13, 29, 33),
        (-13, 29, 98),
    ]]
    fillet(fillet_3_edges, radius=FILLET_3_R)

    # 草图53 → 凸台-拉伸25 (add)
    with BuildSketch(Plane(origin=(0, 0, 33), x_dir=(-1, 0, 0), z_dir=(0, 0, -1))):
        with Locations((-63, 73.5)):
            Rectangle(SKETCH_53_W, SKETCH_53_H)
    extrude(amount=EXTRUDE_25_DEPTH)


solid = part.part
